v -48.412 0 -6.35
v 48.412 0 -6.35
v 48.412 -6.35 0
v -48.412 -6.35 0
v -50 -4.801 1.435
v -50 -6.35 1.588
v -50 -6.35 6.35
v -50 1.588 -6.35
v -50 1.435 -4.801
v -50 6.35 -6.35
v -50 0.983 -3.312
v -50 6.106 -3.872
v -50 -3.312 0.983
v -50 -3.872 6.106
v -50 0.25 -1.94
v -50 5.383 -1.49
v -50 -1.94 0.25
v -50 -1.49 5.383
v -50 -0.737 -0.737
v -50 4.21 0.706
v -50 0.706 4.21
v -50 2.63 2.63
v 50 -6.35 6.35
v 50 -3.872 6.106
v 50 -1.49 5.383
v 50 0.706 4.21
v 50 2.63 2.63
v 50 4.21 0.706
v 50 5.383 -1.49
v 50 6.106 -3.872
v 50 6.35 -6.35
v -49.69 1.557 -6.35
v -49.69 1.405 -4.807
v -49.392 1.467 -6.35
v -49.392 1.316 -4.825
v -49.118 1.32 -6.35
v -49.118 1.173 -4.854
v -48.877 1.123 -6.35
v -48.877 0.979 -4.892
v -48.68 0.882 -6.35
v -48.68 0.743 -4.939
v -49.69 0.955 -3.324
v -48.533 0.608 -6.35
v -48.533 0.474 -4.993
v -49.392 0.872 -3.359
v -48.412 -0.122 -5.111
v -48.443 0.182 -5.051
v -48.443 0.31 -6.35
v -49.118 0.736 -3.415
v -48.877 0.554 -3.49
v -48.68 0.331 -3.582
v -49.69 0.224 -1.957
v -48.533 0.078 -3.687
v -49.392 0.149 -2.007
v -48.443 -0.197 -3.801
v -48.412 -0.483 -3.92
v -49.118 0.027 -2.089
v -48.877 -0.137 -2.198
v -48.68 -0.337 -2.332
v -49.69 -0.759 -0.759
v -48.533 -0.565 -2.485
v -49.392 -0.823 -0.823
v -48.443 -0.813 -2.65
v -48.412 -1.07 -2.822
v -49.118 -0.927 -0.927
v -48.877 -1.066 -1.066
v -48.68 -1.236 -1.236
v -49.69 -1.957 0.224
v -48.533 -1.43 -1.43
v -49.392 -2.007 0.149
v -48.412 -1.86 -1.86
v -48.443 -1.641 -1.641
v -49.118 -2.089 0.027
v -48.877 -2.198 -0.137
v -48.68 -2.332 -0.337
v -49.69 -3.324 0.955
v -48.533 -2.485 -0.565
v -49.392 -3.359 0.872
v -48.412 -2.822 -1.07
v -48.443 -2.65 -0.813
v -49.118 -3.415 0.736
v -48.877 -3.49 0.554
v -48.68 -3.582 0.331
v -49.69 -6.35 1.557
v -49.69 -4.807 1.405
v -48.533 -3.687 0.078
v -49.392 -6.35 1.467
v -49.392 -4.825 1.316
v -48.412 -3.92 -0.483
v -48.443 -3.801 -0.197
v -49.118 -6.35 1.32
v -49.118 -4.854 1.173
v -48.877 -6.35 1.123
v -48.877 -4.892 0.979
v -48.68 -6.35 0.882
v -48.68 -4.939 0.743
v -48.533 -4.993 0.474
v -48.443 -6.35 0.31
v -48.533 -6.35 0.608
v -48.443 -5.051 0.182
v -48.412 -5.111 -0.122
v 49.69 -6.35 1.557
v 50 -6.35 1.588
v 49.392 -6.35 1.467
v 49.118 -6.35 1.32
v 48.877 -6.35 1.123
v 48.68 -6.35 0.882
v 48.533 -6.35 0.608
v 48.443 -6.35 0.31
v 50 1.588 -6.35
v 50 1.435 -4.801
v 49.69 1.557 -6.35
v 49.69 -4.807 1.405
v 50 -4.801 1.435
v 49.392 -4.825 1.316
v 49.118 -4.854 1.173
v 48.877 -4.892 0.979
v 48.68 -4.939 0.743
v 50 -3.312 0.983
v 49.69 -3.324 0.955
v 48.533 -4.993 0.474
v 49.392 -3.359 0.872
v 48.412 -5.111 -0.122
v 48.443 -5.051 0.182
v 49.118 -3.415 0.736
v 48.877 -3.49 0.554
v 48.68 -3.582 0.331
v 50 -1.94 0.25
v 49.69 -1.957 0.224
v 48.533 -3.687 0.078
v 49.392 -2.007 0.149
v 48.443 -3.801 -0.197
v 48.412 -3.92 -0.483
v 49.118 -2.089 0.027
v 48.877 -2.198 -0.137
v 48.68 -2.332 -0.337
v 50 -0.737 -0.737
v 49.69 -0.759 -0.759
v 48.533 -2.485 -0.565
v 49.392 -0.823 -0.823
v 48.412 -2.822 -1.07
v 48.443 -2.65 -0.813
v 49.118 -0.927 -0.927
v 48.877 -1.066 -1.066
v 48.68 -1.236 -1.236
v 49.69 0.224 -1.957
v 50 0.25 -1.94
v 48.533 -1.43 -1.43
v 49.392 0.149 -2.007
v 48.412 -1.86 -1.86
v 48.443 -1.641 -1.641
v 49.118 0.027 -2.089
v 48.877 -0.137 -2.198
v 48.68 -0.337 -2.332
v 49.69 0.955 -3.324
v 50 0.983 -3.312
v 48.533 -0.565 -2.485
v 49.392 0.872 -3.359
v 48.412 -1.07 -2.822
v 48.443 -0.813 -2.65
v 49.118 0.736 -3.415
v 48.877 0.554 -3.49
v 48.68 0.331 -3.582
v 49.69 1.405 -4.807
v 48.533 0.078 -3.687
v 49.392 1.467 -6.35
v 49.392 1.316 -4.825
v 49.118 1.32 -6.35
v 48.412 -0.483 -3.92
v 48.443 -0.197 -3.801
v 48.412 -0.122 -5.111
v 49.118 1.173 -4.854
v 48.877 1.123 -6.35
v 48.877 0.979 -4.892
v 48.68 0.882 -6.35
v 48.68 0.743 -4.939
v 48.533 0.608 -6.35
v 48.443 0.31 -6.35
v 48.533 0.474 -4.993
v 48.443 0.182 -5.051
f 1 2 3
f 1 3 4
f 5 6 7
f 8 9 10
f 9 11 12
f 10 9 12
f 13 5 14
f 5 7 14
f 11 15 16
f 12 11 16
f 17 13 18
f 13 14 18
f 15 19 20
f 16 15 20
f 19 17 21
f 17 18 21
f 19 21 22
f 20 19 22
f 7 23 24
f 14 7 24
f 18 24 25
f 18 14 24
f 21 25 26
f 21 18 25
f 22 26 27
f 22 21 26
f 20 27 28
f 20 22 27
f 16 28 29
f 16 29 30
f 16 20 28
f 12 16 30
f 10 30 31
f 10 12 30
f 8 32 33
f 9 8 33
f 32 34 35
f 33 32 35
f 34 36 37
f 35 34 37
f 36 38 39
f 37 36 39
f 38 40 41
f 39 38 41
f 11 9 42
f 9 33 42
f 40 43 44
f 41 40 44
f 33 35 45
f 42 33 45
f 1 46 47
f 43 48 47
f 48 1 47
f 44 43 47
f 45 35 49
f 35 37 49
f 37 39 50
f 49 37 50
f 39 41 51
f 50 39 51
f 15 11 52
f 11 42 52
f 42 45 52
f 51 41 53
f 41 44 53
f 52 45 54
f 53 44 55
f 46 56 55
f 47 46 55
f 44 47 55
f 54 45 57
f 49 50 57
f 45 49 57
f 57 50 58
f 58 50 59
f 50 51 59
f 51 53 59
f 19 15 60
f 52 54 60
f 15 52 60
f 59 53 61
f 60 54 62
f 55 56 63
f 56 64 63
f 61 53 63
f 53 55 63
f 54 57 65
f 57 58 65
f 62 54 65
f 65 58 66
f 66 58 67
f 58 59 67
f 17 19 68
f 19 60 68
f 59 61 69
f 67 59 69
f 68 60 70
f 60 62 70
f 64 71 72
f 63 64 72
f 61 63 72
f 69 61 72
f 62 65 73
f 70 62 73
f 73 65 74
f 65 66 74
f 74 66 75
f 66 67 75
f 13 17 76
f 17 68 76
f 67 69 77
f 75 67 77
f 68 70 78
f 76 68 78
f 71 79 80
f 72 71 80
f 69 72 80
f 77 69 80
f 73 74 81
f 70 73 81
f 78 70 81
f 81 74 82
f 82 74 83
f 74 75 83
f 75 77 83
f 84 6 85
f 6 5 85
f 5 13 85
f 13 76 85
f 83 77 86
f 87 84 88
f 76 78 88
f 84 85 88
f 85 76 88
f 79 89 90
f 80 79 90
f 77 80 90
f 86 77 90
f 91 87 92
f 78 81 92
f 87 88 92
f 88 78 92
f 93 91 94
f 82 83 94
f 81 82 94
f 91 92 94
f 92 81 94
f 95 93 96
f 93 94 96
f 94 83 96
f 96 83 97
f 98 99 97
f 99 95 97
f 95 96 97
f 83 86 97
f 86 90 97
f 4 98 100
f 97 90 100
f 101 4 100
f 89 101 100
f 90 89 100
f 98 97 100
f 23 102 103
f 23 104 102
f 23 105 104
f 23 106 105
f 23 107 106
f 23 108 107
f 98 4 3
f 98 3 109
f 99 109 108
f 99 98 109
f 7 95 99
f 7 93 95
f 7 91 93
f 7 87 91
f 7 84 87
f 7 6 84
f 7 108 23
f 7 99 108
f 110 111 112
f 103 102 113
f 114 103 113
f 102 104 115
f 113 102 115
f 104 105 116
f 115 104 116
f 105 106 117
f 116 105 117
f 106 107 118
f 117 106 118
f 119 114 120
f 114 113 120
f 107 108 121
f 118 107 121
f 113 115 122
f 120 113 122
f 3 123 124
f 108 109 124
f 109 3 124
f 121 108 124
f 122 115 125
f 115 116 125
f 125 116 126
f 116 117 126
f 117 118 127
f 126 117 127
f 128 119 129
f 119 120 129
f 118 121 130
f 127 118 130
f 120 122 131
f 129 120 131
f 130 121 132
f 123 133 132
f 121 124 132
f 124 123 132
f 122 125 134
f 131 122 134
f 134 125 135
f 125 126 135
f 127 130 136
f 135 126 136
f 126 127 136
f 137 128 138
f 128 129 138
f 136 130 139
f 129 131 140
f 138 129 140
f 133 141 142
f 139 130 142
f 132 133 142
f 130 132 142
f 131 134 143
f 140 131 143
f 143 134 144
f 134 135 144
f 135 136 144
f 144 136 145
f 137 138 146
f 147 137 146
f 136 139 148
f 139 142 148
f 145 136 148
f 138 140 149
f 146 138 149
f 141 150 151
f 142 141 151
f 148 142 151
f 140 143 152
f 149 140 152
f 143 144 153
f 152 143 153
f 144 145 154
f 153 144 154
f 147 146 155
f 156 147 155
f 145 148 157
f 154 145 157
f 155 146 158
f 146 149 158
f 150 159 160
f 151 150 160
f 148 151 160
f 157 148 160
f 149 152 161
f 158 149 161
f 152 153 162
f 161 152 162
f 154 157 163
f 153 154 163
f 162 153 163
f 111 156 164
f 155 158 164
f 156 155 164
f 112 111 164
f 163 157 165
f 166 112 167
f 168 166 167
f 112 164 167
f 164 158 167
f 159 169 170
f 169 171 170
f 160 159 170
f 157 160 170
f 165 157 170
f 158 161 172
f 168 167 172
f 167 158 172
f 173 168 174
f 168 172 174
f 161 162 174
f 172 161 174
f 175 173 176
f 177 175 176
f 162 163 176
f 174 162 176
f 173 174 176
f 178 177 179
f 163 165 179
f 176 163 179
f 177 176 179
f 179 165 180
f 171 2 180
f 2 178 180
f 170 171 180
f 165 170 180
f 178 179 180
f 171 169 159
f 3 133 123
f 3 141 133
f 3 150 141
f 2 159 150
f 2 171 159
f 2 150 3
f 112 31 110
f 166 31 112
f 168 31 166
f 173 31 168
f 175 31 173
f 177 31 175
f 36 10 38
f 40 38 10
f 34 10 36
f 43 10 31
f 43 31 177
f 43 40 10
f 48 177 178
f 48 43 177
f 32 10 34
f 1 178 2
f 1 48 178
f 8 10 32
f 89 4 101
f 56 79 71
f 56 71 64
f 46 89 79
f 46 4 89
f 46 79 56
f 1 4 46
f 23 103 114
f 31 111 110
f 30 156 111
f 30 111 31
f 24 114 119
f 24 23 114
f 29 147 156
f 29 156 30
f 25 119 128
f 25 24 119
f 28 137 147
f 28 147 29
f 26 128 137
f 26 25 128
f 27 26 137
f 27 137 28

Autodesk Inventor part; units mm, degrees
ref_plane "YZ Plane" through (0, 0, 0) normal (1, 0, 0) x (0, 1, 0)
ref_plane "XZ Plane" through (0, 0, 0) normal (0, 1, 0) x (-1, 0, 0)
ref_plane "XY Plane" through (0, 0, 0) normal (0, 0, 1) x (1, 0, 0)
sketch "Sketch1" plane through (0, 0, 0) normal (1, 0, 0) x (0, 1, 0)
  line L0 (-6.35, 6.35) -> (6.35, 6.35)
  line L1 (6.35, 6.35) -> (6.35, -6.35)
  line L2 (6.35, -6.35) -> (-6.35, -6.35)
  line L3 (-6.35, -6.35) -> (-6.35, 6.35)
  line L4 (-6.35, 6.35) -> (6.35, -6.35) construction
  line L5 (6.35, 6.35) -> (-6.35, -6.35) construction
  point P0 (0, 0)
  dimension "d0" = 12.7
  dimension "d1" = 12.7
extrude "Extrusion1" add sketch "Sketch1" along normal mid plane 100
chamfer "Chamfer1" distance 6.35 angle 45 1 edges at (0, -6.35, -6.35)
fillet "Fillet1" radius 12.7 1 edges at (0, 6.35, 6.35)
sketch "Sketch2" plane through (50, 0, -6.35) normal (0, 0, -1) x (-1, 0, 0)
  line L0 (100, 0) -> (0, 0) projected
  line L1 (100, 6.35) -> (100, 0) projected
  line L2 (0, 6.35) -> (100, 6.35) projected
  line L3 (0, 0) -> (0, 6.35) projected
  circle A0 centre (100, 0) radius 1.5875
  line L4 (0, -6.35) -> (100, -6.35) projected
  line L5 (100, 0) -> (0, 0) projected
  line L6 (98.4125, 0) -> (98.4125, -6.35)
  line L7 (101.5875, 0) -> (101.5875, -6.35)
  line L8 (101.5875, -6.35) -> (98.4125, -6.35)
  point P0 (50, 0)
  dimension "d8" = 3.175
revolve "Revolution1" cut sketch "Sketch2" angle 360 about axis through (50, -6.35, -6.35) along (-1, 0, 0) contours L1 A0 L0 | L0 A0 L1 | A0 L7 L8 L4 L6
mirror "Mirror1" about plane through (0, 0, 0) normal (1, 0, 0) of "Revolution1"
equation "\"d0\" = facingThickness"
equation "\"d1\" = facingThickness"
equation "\"d2\" = depth"
equation "\"d4\" = 0.5 * facingThickness"
equation "\"d7\" = facingThickness"
equation "\"d8\" = 0.25 * facingThickness"
equation "\"mppcMountThickness\" = 6.35"
equation "\"depth\" = 100"
equation "\"facingThickness\" = 12.7"
equation "\"facingGasketThickness\" = 1.5875"
properties part number "sideMoulding" material "Wood (Cherry)"
